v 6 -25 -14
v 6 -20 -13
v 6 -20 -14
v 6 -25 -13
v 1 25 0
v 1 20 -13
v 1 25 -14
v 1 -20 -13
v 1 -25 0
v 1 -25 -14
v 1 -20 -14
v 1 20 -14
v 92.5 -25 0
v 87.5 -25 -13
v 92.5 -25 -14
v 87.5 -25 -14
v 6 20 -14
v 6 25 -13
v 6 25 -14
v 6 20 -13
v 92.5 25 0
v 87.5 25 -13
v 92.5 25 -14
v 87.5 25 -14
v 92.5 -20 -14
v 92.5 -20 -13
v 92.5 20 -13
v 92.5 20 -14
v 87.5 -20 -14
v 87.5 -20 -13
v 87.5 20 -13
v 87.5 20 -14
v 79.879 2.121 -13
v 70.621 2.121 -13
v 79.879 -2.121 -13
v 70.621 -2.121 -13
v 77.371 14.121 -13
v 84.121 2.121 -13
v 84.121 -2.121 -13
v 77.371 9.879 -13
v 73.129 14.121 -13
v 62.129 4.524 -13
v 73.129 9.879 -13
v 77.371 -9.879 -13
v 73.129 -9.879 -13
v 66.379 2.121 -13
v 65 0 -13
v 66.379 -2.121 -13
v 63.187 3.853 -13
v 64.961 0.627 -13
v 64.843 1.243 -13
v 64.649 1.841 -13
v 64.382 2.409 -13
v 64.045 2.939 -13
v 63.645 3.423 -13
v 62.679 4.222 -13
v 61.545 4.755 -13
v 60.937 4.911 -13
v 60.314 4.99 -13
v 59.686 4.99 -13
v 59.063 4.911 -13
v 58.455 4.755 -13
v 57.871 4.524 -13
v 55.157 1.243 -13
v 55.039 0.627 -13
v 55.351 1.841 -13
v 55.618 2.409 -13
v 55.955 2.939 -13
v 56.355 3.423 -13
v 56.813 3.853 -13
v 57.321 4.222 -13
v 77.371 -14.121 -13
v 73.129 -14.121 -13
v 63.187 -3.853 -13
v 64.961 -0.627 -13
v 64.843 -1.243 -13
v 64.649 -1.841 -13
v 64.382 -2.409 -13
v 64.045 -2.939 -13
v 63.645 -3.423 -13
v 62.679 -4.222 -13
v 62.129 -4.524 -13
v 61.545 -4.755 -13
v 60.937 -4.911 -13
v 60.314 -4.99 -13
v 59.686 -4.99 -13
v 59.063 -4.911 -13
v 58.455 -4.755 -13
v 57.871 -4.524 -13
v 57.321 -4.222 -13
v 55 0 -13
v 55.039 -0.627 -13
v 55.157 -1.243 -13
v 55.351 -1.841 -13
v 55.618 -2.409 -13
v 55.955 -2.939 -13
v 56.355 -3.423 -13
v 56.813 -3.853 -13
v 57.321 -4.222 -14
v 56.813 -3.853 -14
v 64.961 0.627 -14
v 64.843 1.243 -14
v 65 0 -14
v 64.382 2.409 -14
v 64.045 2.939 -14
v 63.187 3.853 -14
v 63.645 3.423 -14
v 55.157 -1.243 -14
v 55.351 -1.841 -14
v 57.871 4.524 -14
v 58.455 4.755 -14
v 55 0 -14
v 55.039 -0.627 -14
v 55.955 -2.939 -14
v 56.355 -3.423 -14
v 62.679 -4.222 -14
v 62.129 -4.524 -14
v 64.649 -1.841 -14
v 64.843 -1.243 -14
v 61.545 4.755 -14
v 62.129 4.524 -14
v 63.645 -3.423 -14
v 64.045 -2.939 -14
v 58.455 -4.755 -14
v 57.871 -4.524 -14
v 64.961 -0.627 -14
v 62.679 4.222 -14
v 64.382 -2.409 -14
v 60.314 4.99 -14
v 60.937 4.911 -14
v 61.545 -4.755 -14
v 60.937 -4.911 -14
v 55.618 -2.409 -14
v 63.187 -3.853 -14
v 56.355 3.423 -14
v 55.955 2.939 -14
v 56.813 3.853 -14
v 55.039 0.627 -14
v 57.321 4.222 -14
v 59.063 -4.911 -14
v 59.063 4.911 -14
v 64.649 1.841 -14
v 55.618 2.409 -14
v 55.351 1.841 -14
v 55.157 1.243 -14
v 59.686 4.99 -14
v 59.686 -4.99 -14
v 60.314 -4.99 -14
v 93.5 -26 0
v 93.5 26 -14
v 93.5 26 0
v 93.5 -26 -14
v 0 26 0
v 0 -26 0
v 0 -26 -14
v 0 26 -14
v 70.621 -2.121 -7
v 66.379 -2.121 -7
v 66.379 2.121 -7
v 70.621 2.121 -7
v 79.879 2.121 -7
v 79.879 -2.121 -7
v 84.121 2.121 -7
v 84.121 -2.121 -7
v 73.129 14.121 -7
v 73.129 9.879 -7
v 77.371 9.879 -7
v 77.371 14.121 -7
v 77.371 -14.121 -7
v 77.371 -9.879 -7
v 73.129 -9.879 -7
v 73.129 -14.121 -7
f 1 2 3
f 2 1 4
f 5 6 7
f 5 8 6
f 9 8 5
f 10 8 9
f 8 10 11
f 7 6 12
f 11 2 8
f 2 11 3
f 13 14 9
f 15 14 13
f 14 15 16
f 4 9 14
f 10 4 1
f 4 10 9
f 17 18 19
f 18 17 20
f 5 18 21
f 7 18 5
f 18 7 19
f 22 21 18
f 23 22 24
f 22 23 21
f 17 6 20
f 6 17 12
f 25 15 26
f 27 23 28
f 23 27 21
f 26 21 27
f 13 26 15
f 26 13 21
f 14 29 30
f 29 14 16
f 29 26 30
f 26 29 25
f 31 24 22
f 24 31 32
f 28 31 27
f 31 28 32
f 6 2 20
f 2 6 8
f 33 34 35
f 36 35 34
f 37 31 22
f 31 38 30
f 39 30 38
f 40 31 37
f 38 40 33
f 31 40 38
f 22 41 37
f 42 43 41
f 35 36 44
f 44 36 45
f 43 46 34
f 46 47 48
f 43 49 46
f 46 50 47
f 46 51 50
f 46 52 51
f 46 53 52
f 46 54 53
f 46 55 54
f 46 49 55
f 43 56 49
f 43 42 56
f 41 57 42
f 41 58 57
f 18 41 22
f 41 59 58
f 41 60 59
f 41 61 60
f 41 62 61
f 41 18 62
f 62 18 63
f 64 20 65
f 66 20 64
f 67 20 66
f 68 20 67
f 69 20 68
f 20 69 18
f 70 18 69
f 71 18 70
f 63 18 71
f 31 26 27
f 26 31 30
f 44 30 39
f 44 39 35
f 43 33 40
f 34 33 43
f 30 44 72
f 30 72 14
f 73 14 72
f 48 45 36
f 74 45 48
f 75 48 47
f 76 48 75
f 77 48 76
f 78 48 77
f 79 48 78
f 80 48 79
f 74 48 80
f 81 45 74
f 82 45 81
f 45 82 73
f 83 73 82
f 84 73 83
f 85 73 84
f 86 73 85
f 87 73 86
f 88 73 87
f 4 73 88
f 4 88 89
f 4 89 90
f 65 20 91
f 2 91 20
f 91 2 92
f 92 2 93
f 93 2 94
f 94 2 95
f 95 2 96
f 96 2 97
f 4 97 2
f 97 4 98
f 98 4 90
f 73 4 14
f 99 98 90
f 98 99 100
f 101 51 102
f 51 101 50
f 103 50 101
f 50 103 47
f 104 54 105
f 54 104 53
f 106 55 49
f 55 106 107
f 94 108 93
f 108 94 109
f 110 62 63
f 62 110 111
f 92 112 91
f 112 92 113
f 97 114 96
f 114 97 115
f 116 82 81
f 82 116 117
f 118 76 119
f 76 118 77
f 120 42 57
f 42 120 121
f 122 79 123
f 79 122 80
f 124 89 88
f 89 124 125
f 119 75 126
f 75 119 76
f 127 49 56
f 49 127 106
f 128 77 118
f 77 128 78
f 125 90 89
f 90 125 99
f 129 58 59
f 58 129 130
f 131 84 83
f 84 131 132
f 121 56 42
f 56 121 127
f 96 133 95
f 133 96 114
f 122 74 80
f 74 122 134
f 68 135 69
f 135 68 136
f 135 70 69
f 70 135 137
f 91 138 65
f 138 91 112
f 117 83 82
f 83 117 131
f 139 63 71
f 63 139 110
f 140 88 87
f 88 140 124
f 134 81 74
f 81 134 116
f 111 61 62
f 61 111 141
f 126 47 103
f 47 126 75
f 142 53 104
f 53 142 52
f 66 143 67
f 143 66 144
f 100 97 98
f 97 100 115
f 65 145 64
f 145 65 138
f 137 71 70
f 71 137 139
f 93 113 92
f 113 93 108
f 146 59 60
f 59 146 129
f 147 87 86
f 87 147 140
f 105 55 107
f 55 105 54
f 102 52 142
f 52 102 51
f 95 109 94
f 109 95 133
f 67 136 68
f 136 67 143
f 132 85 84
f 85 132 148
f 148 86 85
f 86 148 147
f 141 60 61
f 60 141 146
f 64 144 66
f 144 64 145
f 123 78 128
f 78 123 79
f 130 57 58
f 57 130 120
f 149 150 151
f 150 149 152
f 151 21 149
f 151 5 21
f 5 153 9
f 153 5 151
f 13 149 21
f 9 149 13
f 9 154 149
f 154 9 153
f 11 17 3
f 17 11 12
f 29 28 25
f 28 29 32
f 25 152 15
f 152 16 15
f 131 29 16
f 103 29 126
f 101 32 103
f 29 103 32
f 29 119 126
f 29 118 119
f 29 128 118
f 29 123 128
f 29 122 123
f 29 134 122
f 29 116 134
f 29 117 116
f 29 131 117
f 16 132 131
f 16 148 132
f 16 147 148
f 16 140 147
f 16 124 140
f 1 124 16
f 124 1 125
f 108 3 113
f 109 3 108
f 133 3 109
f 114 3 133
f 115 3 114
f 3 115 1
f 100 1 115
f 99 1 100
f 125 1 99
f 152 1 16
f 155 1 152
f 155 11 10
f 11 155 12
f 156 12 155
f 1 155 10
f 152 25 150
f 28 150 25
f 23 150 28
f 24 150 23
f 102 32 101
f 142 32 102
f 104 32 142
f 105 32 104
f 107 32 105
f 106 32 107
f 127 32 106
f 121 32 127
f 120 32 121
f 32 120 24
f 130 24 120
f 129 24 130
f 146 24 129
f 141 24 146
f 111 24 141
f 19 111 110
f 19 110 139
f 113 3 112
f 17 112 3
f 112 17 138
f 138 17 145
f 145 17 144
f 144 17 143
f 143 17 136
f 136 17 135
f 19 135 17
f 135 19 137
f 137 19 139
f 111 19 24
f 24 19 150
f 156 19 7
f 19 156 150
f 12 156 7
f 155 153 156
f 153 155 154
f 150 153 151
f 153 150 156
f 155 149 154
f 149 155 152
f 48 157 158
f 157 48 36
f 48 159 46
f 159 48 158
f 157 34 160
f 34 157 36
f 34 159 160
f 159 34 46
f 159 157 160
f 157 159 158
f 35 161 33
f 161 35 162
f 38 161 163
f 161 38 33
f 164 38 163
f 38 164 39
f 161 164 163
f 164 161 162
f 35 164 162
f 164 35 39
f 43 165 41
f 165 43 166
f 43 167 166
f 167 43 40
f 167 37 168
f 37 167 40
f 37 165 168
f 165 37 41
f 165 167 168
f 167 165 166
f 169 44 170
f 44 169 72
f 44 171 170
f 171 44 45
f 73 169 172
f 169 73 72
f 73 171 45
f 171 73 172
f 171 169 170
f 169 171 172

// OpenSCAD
led_display_size=32;
led_display_total_size=50;
border_clearance = 10;
front_panel_thickness=2;
button_size=12;
button_clearance=1.5;
cut=50;
button_under_size=button_size+3;
button_under_thickness=2;
container_wall_thickness=1;
$fn=50;

front_panel_height=border_clearance + led_display_size + 3 * button_under_size + 4 + border_clearance/4;
front_panel_width=border_clearance + led_display_size + border_clearance;

module ccube(size = [1,1,1], center = false)
{
  sz = (len(size) == 3)?size:[size,size,size];
  if (len(center) == 1)
    cube(size, center);
  else
    translate([center[0]?-sz[0]/2:0,center[1]?-sz[1]/2:0,center[2]?-sz[2]/2:0])
    cube(size);
}

module button() {
	color([1, 0.5, 0]) difference() {
		union() {
			translate([0, 0, -front_panel_thickness]) cylinder(d=button_size, h=front_panel_thickness+button_under_thickness, $fn=3);
			translate([0, 0, -front_panel_thickness]) cylinder(d=button_under_size, h=button_under_thickness, $fn=3);
		}
		translate([0, 0, -front_panel_thickness -0.2]) cylinder(d=3.55, h=1);
	}
}

module front_panel() {
	difference() {
		union() {
			ccube([front_panel_height, front_panel_width, front_panel_thickness], center=[0, 1, 0]);
			translate([0, 0, -4]) {
				translate([container_wall_thickness, -front_panel_width/2 + container_wall_thickness]) cube(5);
				translate([container_wall_thickness, front_panel_width/2 - container_wall_thickness - 5]) cube(5);
				translate([front_panel_height-container_wall_thickness-5, -front_panel_width/2 + container_wall_thickness]) cube(5);
				translate([front_panel_height-container_wall_thickness-5, front_panel_width/2 - container_wall_thickness - 5]) cube(5);
			}
		}
		translate([0, 0, -1]) union() {
			translate([border_clearance, 0, 0]) ccube([led_display_size, led_display_size, cut], center=[0, 1, 0]);
			%translate([border_clearance, 0, -12.6+1+front_panel_thickness]) ccube([50, led_display_size, 12.6], center=[0, 1, 0]);
			up_button_trans=border_clearance+led_display_total_size+button_under_size/2+1;
			// Up button
			translate([up_button_trans, 0]) rotate([0, 0, 180]) {
				translate([0, 0, 1]) %button();
				cylinder(d=button_size+button_clearance, h=cut ,$fn=3);
			}
			// Down button
			translate([up_button_trans+(button_size+button_clearance), 0]) rotate([0, 0, 0]) {
				translate([0, 0, 1]) %button();
				cylinder(d=button_size+button_clearance, h=cut ,$fn=3);
			}
			// Right button
			translate([up_button_trans+(button_size+button_clearance)/2, button_size]) rotate([0, 0, 90]) {
				translate([0, 0, 1]) %button();
				cylinder(d=button_size+button_clearance, h=cut ,$fn=3);
			}
			// Left button
			translate([up_button_trans+(button_size+button_clearance)/2, -button_size]) rotate([0, 0, -90]) {
				translate([0, 0, 1]) %button();
				cylinder(d=button_size+button_clearance, h=cut ,$fn=3);
			}
		}
	}
}

button_height=5;

module back_panel() {
	difference() {
		union() {
			ccube([front_panel_height, front_panel_width, 13+container_wall_thickness], center=[0, 1, 0]);
		}
		union() {
			translate([container_wall_thickness, 0, container_wall_thickness]) ccube([front_panel_height-2*container_wall_thickness, front_panel_width-2*container_wall_thickness, cut], center=[0, 1, 0]);
			translate([0, 0, -1]) {
				translate([container_wall_thickness, -front_panel_width/2 + container_wall_thickness]) cube(5);
				translate([container_wall_thickness, front_panel_width/2 - container_wall_thickness - 5]) cube(5);
				translate([front_panel_height-container_wall_thickness-5, -front_panel_width/2 + container_wall_thickness]) cube(5);
				translate([front_panel_height-container_wall_thickness-5, front_panel_width/2 - container_wall_thickness - 5]) cube(5);
			}
			translate([border_clearance+led_display_total_size, 0, -1]) cylinder(d=10, h=cut);
		}
	}
	up_button_trans=border_clearance+led_display_total_size+button_under_size/2+1;
	button_bottom_size=6;
	pillar_height=13+container_wall_thickness - button_height - button_under_thickness;
	// Up button
	translate([up_button_trans, 0]) rotate([0, 0, 180+45]) {
		cylinder(d=button_bottom_size, h=pillar_height, $fn=4);
	}
	// Down button
	translate([up_button_trans+(button_size+button_clearance), 0]) rotate([0, 0, 45]) {
		cylinder(d=button_bottom_size, h=pillar_height, $fn=4);
	}
	// Right button
	translate([up_button_trans+(button_size+button_clearance)/2, button_size]) rotate([0, 0, 90+45]) {
		cylinder(d=button_bottom_size, h=pillar_height, $fn=4);
	}
	// Left button
	translate([up_button_trans+(button_size+button_clearance)/2, -button_size]) rotate([0, 0, -90+45]) {
		cylinder(d=button_bottom_size, h=pillar_height, $fn=4);
	}
}


// front_panel();
// button();
translate([0, 0, -13-container_wall_thickness]) back_panel();
